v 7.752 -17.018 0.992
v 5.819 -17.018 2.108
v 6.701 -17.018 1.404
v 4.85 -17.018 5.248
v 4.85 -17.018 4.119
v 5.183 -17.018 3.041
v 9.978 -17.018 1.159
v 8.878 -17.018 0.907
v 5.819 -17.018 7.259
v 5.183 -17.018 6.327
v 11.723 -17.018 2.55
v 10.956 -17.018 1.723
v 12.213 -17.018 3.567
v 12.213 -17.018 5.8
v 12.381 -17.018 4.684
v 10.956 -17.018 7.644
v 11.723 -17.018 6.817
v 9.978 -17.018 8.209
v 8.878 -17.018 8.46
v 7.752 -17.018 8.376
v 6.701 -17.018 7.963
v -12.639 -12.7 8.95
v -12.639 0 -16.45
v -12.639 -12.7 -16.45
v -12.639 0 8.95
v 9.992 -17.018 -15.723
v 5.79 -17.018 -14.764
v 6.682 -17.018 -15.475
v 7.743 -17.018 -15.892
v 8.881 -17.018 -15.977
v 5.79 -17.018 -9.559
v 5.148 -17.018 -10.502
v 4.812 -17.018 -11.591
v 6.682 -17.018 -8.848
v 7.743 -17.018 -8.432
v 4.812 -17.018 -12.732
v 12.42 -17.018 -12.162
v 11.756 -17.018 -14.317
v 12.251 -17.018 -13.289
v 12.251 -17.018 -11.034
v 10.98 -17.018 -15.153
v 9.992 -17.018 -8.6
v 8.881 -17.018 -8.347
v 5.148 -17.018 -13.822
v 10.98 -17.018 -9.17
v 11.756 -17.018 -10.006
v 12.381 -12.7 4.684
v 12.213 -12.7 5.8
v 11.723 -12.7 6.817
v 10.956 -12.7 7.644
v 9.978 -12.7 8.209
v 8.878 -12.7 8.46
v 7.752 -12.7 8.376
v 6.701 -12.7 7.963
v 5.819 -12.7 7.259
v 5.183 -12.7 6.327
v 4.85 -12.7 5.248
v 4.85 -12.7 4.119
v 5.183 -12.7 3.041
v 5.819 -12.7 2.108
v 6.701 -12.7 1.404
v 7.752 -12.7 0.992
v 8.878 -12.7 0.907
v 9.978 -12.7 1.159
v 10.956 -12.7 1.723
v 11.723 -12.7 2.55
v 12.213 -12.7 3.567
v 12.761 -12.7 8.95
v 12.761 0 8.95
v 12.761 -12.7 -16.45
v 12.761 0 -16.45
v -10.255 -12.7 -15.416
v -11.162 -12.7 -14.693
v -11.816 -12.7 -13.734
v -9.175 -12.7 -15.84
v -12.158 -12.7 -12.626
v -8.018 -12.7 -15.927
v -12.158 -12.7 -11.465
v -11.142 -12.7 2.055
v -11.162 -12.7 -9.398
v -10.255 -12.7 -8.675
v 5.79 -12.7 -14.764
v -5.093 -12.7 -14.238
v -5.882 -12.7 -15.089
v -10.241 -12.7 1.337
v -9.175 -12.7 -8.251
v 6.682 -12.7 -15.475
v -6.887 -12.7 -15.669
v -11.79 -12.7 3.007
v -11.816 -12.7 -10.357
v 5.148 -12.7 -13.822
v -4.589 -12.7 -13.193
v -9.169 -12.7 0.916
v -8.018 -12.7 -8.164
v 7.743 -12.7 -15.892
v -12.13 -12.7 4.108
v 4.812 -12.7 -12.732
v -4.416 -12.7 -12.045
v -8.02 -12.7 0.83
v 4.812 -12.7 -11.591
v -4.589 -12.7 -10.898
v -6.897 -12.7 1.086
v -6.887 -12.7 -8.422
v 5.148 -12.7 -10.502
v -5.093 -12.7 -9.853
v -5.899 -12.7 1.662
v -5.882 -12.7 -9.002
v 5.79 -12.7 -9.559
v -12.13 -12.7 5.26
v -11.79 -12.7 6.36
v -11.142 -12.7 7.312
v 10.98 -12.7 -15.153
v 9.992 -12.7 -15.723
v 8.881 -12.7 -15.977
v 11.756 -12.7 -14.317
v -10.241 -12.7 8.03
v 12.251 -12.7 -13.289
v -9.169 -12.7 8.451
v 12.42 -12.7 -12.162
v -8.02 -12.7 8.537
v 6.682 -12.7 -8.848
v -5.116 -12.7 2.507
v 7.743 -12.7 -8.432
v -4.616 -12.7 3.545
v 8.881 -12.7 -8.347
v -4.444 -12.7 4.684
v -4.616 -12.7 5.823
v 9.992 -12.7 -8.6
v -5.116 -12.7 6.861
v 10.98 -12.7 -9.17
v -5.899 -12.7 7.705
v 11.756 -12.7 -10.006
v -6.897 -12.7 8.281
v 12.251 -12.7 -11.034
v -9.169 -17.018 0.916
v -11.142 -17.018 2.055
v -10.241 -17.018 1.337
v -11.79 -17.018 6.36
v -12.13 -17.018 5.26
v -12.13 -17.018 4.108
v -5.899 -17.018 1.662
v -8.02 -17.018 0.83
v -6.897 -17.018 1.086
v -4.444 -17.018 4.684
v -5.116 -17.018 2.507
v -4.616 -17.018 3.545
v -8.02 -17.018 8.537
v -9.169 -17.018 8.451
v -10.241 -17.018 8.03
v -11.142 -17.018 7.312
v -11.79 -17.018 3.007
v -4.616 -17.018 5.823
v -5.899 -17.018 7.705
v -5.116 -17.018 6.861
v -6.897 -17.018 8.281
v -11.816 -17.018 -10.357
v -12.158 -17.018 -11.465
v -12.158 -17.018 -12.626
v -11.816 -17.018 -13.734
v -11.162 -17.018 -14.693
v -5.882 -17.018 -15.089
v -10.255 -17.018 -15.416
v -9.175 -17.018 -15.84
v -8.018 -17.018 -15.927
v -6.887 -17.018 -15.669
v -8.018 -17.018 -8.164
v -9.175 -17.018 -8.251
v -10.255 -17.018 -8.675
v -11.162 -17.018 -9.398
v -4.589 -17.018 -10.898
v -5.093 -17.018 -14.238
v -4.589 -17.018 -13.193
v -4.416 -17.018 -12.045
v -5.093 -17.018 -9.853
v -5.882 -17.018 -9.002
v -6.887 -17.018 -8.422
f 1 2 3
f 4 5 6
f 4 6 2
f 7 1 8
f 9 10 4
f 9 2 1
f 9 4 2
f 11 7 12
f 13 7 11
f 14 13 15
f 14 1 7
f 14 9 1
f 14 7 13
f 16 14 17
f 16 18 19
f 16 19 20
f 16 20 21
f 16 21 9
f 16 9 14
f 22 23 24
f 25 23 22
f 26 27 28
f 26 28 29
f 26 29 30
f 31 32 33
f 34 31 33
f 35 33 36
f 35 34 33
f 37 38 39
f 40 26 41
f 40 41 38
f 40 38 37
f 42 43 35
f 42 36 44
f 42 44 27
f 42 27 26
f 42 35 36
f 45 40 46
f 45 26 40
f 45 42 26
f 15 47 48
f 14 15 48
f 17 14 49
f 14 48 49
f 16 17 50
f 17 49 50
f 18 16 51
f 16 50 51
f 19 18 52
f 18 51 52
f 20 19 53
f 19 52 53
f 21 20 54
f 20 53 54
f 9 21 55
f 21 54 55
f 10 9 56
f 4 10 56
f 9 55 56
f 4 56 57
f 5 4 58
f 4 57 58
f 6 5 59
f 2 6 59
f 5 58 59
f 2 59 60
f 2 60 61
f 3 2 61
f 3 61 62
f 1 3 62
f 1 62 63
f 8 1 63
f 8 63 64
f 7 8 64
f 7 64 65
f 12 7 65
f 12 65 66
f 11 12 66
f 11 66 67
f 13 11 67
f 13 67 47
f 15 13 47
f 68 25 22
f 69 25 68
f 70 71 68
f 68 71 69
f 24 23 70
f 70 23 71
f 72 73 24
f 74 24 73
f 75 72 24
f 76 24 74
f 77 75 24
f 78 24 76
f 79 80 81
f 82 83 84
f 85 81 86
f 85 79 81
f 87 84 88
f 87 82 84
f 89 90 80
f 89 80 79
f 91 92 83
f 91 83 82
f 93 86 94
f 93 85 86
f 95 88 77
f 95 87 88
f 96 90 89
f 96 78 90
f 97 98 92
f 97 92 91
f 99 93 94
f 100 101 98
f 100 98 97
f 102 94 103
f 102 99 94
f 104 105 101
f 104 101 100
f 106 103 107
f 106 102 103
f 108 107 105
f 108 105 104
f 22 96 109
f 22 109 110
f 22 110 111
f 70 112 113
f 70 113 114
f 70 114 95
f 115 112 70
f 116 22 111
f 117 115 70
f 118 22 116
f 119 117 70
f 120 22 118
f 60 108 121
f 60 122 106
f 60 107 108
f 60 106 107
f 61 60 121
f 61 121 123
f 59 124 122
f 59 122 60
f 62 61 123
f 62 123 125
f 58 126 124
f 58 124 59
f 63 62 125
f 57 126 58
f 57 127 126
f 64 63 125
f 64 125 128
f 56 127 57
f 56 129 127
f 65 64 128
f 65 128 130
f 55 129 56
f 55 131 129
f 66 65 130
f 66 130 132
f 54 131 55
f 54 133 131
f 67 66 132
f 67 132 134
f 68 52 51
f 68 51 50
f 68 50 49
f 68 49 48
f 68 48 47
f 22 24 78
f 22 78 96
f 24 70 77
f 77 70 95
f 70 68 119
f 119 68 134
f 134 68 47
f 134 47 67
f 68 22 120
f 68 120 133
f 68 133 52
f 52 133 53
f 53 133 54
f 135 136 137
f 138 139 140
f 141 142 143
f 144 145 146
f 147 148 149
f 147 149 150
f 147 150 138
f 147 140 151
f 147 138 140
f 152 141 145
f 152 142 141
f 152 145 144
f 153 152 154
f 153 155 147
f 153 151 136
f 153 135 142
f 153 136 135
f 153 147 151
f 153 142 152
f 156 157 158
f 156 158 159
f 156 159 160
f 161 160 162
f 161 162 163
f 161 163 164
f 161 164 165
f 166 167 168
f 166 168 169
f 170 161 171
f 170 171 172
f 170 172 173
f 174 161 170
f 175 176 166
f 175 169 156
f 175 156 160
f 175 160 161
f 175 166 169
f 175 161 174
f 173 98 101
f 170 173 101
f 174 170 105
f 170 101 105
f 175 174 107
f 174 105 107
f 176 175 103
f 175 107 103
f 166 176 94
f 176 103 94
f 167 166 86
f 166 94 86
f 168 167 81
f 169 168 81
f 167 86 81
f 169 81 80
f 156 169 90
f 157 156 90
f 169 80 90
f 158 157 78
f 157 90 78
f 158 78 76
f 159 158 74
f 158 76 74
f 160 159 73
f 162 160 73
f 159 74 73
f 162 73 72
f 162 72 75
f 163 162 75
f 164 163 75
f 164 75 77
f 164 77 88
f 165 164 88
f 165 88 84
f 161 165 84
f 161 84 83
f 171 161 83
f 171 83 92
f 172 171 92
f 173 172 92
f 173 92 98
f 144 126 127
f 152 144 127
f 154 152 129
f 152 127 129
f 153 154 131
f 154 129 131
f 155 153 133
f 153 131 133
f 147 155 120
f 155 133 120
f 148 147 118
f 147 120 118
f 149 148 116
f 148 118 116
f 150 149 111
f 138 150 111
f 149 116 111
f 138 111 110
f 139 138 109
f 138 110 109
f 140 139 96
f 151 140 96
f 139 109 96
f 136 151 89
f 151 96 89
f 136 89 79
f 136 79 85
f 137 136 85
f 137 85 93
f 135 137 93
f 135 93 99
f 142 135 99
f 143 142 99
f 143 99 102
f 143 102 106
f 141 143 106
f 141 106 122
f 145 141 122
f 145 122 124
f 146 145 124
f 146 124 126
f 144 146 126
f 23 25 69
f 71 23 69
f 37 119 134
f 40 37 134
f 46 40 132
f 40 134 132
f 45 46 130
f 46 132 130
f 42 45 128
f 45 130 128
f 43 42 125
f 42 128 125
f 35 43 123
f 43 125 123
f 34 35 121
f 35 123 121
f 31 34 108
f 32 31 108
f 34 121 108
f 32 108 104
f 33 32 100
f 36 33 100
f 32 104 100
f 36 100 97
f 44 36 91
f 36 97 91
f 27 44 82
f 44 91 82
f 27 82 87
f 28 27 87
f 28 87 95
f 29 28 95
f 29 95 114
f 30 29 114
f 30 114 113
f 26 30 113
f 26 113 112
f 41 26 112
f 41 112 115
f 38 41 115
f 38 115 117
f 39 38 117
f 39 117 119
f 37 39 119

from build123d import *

# Parameters (mm, degrees)
F0_W     = 25.4
F0_H     = 25.4
F1_DEPTH = 12.7
F2_R     = 3.892272
F3_DEPTH = 17.018
F2_R_2   = 3.825823
F4_DEPTH = 17.018
F2_R_3   = 3.864432
F5_DEPTH = 17.018
F2_R_4   = 3.786819
F6_DEPTH = 17.018


with BuildPart() as f1:
    # F0 (on Front) → F1 (new body)
    with BuildSketch(Plane.XZ):
        with Locations((0.061012, -3.750413)):
            Rectangle(F0_W, F0_H)
    extrude(amount=F1_DEPTH)

    # F2 (on Front) → F3 (join)
    with BuildSketch(Plane.XZ):
        with Locations((-8.308703, -12.045457)):
            Circle(F2_R)
    extrude(amount=F3_DEPTH)

    # F2 (on Front) → F4 (join)
    with BuildSketch(Plane.XZ):
        with Locations((8.594656, -12.16163)):
            Circle(F2_R_2)
    extrude(amount=F4_DEPTH)

    # F2 (on Front) → F5 (join)
    with BuildSketch(Plane.XZ):
        with Locations((-8.308703, 4.683642)):
            Circle(F2_R_3)
    extrude(amount=F5_DEPTH)

    # F2 (on Front) → F6 (join)
    with BuildSketch(Plane.XZ):
        with Locations((8.594656, 4.683642)):
            Circle(F2_R_4)
    extrude(amount=F6_DEPTH)


solid = f1.part
